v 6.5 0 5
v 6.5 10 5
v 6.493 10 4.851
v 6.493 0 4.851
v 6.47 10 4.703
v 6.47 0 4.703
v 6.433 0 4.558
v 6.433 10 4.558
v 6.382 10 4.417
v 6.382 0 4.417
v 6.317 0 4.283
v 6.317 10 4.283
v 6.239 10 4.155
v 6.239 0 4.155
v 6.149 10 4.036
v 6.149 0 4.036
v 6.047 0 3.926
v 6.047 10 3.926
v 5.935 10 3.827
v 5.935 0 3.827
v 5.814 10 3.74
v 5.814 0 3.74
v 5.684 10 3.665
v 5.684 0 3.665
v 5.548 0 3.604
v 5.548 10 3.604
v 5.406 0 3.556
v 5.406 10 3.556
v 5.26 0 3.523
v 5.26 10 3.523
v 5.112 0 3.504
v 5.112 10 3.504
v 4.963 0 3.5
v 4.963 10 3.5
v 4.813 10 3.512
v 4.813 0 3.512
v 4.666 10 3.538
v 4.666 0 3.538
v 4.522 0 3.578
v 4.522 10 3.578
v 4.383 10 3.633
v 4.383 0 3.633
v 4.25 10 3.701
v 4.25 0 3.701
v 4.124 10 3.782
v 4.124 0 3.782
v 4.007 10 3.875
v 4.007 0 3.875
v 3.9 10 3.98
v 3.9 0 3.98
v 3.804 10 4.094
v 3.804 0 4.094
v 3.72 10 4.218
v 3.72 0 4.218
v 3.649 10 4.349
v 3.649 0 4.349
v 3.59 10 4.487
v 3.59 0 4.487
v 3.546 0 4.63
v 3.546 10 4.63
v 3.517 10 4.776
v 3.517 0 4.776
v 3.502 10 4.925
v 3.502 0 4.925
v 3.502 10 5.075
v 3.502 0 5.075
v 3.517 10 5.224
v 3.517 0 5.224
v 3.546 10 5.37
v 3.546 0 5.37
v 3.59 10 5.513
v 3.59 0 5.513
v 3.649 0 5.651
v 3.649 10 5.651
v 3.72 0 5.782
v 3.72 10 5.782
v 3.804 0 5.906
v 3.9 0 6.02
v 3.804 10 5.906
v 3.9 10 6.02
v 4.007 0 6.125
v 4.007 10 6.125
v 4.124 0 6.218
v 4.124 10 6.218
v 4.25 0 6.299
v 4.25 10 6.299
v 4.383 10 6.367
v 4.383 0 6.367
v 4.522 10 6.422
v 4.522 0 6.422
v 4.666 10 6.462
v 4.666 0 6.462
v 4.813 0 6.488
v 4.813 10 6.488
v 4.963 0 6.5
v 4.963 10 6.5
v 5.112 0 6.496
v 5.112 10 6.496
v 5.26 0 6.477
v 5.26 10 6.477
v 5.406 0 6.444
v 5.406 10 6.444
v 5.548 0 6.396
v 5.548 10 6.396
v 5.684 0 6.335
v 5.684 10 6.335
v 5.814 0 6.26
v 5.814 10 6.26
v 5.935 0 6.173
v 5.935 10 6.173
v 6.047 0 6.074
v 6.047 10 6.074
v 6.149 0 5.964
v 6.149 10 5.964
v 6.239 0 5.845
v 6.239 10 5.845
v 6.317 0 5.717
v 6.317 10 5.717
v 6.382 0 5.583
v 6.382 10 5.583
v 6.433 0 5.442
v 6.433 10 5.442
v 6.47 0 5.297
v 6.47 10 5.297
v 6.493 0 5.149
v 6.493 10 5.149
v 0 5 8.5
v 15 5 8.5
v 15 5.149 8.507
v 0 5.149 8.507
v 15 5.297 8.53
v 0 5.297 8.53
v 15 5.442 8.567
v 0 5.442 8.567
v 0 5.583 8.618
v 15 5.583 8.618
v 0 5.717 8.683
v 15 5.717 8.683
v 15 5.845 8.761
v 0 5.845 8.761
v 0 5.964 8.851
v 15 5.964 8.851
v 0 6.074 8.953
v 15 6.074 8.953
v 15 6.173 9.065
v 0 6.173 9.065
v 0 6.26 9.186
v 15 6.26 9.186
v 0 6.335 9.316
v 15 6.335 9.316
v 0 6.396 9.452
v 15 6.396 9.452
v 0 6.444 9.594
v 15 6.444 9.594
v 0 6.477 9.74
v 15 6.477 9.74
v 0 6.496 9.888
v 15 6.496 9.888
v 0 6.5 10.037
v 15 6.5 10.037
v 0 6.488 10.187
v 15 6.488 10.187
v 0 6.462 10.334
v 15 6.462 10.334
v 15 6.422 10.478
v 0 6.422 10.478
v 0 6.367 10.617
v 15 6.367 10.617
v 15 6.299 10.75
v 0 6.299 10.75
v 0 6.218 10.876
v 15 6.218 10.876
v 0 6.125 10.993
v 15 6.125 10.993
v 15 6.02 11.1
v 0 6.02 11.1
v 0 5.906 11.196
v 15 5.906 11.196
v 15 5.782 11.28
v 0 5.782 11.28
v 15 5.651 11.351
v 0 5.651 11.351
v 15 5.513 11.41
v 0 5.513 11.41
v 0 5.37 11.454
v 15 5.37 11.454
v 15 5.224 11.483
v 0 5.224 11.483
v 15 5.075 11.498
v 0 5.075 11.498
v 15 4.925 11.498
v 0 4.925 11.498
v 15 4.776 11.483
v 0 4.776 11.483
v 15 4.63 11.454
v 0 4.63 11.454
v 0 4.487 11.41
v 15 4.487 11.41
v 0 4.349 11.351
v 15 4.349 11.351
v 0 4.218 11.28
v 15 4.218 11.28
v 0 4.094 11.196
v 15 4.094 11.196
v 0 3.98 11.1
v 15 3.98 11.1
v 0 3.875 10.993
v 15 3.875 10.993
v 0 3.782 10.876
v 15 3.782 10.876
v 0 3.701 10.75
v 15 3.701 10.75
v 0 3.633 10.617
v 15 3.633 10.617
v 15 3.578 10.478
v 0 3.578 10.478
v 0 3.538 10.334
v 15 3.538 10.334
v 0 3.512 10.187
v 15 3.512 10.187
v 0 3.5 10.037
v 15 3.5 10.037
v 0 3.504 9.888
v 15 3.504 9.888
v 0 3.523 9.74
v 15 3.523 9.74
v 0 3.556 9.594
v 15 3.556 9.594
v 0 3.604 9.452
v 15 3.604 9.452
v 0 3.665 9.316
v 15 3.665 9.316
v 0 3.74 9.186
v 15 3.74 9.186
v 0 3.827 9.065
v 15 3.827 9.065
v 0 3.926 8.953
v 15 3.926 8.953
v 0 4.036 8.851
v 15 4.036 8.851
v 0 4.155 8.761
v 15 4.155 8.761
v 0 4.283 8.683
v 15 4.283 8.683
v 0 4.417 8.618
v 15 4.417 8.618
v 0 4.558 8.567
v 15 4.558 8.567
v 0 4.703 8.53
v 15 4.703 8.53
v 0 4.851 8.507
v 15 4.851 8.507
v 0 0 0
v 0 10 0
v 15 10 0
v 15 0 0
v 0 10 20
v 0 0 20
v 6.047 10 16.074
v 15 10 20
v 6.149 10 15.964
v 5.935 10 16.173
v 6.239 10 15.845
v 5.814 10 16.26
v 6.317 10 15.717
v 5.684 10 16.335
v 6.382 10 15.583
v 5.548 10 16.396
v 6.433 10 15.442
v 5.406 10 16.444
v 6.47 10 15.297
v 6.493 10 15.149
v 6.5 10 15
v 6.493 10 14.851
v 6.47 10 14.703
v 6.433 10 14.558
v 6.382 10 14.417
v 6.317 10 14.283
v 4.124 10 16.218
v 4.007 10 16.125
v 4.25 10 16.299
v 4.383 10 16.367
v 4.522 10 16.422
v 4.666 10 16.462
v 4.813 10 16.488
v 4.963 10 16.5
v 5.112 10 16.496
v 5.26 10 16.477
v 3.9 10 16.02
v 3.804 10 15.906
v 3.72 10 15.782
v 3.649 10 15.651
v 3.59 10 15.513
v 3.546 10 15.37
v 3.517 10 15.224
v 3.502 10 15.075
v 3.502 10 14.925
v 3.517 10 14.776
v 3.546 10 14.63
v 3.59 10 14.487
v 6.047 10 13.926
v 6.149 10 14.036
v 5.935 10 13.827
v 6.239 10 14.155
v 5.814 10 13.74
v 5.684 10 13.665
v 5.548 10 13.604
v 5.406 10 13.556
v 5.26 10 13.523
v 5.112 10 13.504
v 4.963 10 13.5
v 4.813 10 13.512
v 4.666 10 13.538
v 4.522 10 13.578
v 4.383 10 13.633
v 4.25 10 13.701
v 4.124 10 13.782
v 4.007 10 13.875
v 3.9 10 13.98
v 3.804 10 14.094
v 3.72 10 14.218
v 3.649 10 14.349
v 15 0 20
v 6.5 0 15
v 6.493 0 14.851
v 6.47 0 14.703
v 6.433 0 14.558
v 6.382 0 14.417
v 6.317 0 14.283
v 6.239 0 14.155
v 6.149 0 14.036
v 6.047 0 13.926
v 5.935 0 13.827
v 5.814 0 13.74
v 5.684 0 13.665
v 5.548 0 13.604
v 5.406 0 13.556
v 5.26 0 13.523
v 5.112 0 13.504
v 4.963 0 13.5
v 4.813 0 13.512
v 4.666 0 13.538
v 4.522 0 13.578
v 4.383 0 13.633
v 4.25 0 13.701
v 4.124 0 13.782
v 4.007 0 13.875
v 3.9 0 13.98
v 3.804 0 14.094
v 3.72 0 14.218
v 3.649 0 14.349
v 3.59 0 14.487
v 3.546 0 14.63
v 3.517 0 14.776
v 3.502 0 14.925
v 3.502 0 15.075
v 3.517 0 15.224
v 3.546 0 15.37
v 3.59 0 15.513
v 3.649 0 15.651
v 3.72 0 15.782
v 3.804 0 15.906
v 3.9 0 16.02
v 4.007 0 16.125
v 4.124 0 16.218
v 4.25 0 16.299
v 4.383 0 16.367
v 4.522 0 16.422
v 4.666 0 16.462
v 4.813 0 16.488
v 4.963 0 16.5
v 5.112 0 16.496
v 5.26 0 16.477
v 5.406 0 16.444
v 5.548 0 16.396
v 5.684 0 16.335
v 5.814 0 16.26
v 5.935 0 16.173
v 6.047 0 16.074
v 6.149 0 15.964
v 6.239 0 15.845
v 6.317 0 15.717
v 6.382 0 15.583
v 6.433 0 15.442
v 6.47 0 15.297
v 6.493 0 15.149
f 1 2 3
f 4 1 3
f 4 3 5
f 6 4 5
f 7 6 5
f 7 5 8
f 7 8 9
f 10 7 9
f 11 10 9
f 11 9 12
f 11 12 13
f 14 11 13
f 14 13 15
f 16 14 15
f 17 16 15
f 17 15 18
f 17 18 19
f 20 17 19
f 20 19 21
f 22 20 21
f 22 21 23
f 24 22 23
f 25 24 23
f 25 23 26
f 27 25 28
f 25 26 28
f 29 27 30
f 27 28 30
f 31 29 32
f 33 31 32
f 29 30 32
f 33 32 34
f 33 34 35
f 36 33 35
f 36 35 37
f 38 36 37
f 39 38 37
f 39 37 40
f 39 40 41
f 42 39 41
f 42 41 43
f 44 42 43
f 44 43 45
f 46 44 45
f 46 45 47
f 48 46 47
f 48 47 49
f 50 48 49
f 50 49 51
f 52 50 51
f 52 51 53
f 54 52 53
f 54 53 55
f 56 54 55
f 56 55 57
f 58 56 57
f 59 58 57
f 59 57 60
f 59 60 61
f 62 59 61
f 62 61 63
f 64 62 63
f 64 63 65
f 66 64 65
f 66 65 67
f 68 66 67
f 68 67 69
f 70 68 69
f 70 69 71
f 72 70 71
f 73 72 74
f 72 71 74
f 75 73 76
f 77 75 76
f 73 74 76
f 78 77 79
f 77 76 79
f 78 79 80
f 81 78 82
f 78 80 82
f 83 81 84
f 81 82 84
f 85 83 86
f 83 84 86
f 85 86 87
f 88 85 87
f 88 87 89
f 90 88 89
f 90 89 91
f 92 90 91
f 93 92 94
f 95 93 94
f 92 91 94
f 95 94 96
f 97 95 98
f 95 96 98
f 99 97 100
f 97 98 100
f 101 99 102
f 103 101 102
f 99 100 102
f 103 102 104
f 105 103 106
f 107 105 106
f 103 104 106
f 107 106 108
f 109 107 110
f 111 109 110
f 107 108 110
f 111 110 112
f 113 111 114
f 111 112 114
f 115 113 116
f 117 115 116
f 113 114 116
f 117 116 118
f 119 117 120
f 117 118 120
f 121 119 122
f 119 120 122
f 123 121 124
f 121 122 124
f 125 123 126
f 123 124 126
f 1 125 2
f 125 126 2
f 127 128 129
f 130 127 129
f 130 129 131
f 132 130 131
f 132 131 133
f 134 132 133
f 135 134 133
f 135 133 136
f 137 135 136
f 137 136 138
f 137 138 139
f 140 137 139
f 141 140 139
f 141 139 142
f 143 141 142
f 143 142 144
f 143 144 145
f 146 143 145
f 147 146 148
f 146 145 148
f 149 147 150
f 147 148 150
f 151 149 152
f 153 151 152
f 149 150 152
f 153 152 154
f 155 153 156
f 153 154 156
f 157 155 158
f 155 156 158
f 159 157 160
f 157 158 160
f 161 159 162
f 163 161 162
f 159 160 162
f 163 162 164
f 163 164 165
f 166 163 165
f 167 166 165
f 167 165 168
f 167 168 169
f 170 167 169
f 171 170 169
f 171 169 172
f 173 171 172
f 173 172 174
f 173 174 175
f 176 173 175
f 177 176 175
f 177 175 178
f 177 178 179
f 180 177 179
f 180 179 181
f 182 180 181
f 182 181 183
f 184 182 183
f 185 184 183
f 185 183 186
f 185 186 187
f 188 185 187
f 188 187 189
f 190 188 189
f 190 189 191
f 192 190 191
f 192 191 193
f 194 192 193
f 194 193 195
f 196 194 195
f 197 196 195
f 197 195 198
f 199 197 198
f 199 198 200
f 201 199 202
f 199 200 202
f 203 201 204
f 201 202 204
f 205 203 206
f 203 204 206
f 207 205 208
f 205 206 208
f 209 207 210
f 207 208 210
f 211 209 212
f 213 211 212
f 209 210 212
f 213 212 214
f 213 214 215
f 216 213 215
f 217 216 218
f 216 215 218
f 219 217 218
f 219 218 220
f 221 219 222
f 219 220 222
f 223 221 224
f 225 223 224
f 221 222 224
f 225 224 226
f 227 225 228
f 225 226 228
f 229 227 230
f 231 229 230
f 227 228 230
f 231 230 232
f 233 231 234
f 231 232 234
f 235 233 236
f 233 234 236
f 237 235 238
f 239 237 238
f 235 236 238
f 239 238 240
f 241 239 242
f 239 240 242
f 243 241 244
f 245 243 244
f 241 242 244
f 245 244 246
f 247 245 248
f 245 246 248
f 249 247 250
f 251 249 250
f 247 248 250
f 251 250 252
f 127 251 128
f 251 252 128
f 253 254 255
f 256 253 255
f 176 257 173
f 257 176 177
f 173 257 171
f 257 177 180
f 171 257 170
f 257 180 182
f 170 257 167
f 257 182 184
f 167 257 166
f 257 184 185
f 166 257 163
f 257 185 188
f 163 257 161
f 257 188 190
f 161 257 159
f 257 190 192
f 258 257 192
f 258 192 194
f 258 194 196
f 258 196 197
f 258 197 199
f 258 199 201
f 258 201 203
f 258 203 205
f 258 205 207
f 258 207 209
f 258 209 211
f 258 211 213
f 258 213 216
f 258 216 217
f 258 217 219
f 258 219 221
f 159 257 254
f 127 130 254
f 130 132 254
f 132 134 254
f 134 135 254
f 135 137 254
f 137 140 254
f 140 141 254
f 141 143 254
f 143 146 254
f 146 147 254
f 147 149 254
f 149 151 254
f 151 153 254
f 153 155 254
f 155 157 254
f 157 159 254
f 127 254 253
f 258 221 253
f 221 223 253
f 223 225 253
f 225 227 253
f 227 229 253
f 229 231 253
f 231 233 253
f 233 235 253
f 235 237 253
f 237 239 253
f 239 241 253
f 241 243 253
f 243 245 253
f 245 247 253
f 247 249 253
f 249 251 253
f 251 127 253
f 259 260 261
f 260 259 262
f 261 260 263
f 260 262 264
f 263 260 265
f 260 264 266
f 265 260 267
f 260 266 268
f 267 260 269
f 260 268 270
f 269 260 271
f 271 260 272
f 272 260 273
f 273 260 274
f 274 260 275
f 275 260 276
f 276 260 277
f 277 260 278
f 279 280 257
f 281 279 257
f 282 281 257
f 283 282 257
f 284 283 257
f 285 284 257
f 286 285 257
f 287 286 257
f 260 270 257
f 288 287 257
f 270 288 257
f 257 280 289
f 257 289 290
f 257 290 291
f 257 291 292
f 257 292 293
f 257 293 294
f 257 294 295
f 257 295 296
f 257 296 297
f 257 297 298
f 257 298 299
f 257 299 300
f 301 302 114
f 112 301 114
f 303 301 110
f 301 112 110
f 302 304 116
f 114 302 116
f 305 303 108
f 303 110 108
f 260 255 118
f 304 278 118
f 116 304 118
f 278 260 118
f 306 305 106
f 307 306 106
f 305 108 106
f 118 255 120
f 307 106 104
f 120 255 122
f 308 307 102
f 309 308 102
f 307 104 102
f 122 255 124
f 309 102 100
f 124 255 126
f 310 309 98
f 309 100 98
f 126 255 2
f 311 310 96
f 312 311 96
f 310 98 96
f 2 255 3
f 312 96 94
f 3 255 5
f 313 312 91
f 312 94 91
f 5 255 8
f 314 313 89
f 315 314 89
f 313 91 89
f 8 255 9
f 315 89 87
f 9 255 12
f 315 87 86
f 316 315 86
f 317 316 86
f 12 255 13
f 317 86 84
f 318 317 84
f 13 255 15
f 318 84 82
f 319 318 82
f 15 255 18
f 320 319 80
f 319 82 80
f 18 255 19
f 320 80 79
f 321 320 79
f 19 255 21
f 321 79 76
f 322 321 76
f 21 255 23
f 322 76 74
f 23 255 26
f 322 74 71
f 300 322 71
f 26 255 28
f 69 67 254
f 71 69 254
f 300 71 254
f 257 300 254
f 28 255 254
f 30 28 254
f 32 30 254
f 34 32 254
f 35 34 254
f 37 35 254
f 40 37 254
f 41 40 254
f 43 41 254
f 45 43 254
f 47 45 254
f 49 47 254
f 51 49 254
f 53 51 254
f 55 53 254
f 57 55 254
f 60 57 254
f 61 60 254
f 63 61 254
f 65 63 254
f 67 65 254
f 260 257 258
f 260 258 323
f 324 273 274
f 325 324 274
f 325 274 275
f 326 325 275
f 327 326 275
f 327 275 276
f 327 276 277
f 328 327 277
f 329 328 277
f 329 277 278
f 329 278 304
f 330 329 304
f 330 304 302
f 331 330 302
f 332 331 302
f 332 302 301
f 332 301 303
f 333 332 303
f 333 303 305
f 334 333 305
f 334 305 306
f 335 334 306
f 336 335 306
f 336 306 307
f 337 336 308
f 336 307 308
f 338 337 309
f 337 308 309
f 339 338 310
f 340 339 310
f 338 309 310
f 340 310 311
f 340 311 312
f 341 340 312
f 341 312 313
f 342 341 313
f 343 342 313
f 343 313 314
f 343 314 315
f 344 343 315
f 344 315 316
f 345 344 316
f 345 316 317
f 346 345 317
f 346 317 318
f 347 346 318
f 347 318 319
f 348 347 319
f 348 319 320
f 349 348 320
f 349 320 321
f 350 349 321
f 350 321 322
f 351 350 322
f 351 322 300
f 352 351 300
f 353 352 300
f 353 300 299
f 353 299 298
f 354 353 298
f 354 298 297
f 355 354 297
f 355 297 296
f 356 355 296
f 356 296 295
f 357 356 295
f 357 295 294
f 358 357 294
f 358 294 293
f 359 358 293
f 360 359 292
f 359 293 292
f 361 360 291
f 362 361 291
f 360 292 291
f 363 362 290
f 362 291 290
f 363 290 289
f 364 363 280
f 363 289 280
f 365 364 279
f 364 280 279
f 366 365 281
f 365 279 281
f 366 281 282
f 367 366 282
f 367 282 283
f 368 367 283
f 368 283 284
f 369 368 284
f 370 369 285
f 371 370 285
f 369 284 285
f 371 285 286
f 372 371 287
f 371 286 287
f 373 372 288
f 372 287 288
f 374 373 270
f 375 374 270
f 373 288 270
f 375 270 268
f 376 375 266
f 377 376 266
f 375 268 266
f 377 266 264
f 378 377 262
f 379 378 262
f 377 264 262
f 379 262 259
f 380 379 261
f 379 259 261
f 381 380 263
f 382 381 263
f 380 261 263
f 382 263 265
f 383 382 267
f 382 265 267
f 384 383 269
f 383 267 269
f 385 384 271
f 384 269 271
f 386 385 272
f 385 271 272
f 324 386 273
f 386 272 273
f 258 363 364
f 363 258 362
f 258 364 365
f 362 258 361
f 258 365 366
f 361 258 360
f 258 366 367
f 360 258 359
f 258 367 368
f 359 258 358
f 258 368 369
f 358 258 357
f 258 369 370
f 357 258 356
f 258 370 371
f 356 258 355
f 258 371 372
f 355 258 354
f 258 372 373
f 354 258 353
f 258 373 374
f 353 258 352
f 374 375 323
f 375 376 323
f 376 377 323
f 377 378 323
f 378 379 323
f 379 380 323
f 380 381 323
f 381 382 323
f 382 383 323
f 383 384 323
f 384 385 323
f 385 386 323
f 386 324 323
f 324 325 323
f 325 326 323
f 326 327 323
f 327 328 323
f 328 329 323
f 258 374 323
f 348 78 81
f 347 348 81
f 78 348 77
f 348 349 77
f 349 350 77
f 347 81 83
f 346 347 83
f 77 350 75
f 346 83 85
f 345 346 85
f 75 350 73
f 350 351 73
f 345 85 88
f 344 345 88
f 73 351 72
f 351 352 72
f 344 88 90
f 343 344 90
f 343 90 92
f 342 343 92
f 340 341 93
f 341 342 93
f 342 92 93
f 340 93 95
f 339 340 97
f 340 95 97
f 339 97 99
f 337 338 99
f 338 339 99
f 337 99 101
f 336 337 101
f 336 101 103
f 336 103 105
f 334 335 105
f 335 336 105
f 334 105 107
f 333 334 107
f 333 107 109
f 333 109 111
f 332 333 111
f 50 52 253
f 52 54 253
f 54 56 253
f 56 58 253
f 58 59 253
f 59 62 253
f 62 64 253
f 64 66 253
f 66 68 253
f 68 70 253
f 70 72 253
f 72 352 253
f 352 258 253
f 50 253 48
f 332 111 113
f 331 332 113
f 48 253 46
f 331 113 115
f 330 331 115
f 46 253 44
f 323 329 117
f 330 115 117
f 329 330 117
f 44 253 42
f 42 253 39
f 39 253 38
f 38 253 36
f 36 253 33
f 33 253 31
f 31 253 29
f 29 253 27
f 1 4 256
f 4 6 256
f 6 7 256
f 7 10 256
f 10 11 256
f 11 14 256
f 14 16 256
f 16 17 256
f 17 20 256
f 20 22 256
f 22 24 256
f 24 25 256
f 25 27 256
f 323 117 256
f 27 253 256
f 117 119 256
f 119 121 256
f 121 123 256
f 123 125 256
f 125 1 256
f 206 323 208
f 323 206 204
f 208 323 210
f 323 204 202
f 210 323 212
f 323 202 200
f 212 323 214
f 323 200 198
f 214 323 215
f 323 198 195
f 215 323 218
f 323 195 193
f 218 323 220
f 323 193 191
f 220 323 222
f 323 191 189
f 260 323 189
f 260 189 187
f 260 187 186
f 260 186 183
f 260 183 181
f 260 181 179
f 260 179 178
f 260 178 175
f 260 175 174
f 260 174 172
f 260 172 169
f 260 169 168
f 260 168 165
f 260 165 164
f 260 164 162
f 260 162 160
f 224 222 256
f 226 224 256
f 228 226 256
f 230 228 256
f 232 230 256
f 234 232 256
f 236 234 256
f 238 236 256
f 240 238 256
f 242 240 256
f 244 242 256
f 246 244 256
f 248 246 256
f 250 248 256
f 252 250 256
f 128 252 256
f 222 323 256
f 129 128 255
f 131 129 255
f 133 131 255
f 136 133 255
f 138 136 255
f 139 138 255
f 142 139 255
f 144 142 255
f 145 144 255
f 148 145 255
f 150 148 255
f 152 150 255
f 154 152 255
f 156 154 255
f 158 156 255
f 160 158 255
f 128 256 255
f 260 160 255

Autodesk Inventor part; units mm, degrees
ref_plane "YZ Plane" through (0, 0, 0) normal (1, 0, 0) x (0, 1, 0)
ref_plane "XZ Plane" through (0, 0, 0) normal (0, 1, 0) x (-1, 0, 0)
ref_plane "XY Plane" through (0, 0, 0) normal (0, 0, 1) x (1, 0, 0)
sketch "Sketch1" plane through (0, 0, 0) normal (0, 0, 1) x (1, 0, 0)
  line L0 (0, 0) -> (15, 0)
  line L1 (15, 0) -> (15, 10)
  line L2 (15, 10) -> (0, 10)
  line L3 (0, 10) -> (0, 0)
  line L4 (1, 9) -> (14, 9)
  line L5 (14, 9) -> (14, 1)
  line L6 (14, 1) -> (1, 1)
  line L7 (1, 1) -> (1, 9)
  dimension "d0" = 15
  dimension "d1" = 10
  dimension "d2" = 13
  dimension "d3" = 8
  dimension "d4" = 1
  dimension "d5" = 1
extrude "Extrusion1" add sketch "Sketch1" along normal blind 20 contours L3 L2 L1 L0 | L4 L5 L6 L7
sketch "Sketch2" plane through (0, 10, 0) normal (0, 1, 0) x (1, 0, 0)
  line L0 (15, 0) -> (0, 0) projected
  line L1 (0, 0) -> (0, -20) projected
  line L2 (15, -20) -> (0, -20) projected
  line L3 (15, 0) -> (15, -20) projected
  circle A0 centre (5, -5) radius 1.5
  circle A1 centre (5, -15) radius 1.5
  dimension "d8" = 3
  dimension "d9" = 3
  dimension "d10" = 5
  dimension "d11" = 5
  dimension "d12" = 5
  dimension "d13" = 5
extrude "Extrusion2" cut sketch "Sketch2" against normal up to surface (10 mm away) contours A0 | A1
sketch "Sketch3" plane through (15, 0, 0) normal (1, 0, 0) x (0, 0, -1)
  line L0 (0, 0) -> (0, 10) projected
  line L1 (0, 10) -> (-20, 10) projected
  line L2 (-20, 0) -> (-20, 10) projected
  line L3 (0, 0) -> (-20, 0) projected
  circle A0 centre (-10, 5) radius 1.5
  dimension "d16" = 3
  dimension "d17" = 5
  dimension "d18" = 10
extrude "Extrusion3" cut sketch "Sketch3" against normal up to surface (15 mm away) contours A0
properties part number "profile1"
